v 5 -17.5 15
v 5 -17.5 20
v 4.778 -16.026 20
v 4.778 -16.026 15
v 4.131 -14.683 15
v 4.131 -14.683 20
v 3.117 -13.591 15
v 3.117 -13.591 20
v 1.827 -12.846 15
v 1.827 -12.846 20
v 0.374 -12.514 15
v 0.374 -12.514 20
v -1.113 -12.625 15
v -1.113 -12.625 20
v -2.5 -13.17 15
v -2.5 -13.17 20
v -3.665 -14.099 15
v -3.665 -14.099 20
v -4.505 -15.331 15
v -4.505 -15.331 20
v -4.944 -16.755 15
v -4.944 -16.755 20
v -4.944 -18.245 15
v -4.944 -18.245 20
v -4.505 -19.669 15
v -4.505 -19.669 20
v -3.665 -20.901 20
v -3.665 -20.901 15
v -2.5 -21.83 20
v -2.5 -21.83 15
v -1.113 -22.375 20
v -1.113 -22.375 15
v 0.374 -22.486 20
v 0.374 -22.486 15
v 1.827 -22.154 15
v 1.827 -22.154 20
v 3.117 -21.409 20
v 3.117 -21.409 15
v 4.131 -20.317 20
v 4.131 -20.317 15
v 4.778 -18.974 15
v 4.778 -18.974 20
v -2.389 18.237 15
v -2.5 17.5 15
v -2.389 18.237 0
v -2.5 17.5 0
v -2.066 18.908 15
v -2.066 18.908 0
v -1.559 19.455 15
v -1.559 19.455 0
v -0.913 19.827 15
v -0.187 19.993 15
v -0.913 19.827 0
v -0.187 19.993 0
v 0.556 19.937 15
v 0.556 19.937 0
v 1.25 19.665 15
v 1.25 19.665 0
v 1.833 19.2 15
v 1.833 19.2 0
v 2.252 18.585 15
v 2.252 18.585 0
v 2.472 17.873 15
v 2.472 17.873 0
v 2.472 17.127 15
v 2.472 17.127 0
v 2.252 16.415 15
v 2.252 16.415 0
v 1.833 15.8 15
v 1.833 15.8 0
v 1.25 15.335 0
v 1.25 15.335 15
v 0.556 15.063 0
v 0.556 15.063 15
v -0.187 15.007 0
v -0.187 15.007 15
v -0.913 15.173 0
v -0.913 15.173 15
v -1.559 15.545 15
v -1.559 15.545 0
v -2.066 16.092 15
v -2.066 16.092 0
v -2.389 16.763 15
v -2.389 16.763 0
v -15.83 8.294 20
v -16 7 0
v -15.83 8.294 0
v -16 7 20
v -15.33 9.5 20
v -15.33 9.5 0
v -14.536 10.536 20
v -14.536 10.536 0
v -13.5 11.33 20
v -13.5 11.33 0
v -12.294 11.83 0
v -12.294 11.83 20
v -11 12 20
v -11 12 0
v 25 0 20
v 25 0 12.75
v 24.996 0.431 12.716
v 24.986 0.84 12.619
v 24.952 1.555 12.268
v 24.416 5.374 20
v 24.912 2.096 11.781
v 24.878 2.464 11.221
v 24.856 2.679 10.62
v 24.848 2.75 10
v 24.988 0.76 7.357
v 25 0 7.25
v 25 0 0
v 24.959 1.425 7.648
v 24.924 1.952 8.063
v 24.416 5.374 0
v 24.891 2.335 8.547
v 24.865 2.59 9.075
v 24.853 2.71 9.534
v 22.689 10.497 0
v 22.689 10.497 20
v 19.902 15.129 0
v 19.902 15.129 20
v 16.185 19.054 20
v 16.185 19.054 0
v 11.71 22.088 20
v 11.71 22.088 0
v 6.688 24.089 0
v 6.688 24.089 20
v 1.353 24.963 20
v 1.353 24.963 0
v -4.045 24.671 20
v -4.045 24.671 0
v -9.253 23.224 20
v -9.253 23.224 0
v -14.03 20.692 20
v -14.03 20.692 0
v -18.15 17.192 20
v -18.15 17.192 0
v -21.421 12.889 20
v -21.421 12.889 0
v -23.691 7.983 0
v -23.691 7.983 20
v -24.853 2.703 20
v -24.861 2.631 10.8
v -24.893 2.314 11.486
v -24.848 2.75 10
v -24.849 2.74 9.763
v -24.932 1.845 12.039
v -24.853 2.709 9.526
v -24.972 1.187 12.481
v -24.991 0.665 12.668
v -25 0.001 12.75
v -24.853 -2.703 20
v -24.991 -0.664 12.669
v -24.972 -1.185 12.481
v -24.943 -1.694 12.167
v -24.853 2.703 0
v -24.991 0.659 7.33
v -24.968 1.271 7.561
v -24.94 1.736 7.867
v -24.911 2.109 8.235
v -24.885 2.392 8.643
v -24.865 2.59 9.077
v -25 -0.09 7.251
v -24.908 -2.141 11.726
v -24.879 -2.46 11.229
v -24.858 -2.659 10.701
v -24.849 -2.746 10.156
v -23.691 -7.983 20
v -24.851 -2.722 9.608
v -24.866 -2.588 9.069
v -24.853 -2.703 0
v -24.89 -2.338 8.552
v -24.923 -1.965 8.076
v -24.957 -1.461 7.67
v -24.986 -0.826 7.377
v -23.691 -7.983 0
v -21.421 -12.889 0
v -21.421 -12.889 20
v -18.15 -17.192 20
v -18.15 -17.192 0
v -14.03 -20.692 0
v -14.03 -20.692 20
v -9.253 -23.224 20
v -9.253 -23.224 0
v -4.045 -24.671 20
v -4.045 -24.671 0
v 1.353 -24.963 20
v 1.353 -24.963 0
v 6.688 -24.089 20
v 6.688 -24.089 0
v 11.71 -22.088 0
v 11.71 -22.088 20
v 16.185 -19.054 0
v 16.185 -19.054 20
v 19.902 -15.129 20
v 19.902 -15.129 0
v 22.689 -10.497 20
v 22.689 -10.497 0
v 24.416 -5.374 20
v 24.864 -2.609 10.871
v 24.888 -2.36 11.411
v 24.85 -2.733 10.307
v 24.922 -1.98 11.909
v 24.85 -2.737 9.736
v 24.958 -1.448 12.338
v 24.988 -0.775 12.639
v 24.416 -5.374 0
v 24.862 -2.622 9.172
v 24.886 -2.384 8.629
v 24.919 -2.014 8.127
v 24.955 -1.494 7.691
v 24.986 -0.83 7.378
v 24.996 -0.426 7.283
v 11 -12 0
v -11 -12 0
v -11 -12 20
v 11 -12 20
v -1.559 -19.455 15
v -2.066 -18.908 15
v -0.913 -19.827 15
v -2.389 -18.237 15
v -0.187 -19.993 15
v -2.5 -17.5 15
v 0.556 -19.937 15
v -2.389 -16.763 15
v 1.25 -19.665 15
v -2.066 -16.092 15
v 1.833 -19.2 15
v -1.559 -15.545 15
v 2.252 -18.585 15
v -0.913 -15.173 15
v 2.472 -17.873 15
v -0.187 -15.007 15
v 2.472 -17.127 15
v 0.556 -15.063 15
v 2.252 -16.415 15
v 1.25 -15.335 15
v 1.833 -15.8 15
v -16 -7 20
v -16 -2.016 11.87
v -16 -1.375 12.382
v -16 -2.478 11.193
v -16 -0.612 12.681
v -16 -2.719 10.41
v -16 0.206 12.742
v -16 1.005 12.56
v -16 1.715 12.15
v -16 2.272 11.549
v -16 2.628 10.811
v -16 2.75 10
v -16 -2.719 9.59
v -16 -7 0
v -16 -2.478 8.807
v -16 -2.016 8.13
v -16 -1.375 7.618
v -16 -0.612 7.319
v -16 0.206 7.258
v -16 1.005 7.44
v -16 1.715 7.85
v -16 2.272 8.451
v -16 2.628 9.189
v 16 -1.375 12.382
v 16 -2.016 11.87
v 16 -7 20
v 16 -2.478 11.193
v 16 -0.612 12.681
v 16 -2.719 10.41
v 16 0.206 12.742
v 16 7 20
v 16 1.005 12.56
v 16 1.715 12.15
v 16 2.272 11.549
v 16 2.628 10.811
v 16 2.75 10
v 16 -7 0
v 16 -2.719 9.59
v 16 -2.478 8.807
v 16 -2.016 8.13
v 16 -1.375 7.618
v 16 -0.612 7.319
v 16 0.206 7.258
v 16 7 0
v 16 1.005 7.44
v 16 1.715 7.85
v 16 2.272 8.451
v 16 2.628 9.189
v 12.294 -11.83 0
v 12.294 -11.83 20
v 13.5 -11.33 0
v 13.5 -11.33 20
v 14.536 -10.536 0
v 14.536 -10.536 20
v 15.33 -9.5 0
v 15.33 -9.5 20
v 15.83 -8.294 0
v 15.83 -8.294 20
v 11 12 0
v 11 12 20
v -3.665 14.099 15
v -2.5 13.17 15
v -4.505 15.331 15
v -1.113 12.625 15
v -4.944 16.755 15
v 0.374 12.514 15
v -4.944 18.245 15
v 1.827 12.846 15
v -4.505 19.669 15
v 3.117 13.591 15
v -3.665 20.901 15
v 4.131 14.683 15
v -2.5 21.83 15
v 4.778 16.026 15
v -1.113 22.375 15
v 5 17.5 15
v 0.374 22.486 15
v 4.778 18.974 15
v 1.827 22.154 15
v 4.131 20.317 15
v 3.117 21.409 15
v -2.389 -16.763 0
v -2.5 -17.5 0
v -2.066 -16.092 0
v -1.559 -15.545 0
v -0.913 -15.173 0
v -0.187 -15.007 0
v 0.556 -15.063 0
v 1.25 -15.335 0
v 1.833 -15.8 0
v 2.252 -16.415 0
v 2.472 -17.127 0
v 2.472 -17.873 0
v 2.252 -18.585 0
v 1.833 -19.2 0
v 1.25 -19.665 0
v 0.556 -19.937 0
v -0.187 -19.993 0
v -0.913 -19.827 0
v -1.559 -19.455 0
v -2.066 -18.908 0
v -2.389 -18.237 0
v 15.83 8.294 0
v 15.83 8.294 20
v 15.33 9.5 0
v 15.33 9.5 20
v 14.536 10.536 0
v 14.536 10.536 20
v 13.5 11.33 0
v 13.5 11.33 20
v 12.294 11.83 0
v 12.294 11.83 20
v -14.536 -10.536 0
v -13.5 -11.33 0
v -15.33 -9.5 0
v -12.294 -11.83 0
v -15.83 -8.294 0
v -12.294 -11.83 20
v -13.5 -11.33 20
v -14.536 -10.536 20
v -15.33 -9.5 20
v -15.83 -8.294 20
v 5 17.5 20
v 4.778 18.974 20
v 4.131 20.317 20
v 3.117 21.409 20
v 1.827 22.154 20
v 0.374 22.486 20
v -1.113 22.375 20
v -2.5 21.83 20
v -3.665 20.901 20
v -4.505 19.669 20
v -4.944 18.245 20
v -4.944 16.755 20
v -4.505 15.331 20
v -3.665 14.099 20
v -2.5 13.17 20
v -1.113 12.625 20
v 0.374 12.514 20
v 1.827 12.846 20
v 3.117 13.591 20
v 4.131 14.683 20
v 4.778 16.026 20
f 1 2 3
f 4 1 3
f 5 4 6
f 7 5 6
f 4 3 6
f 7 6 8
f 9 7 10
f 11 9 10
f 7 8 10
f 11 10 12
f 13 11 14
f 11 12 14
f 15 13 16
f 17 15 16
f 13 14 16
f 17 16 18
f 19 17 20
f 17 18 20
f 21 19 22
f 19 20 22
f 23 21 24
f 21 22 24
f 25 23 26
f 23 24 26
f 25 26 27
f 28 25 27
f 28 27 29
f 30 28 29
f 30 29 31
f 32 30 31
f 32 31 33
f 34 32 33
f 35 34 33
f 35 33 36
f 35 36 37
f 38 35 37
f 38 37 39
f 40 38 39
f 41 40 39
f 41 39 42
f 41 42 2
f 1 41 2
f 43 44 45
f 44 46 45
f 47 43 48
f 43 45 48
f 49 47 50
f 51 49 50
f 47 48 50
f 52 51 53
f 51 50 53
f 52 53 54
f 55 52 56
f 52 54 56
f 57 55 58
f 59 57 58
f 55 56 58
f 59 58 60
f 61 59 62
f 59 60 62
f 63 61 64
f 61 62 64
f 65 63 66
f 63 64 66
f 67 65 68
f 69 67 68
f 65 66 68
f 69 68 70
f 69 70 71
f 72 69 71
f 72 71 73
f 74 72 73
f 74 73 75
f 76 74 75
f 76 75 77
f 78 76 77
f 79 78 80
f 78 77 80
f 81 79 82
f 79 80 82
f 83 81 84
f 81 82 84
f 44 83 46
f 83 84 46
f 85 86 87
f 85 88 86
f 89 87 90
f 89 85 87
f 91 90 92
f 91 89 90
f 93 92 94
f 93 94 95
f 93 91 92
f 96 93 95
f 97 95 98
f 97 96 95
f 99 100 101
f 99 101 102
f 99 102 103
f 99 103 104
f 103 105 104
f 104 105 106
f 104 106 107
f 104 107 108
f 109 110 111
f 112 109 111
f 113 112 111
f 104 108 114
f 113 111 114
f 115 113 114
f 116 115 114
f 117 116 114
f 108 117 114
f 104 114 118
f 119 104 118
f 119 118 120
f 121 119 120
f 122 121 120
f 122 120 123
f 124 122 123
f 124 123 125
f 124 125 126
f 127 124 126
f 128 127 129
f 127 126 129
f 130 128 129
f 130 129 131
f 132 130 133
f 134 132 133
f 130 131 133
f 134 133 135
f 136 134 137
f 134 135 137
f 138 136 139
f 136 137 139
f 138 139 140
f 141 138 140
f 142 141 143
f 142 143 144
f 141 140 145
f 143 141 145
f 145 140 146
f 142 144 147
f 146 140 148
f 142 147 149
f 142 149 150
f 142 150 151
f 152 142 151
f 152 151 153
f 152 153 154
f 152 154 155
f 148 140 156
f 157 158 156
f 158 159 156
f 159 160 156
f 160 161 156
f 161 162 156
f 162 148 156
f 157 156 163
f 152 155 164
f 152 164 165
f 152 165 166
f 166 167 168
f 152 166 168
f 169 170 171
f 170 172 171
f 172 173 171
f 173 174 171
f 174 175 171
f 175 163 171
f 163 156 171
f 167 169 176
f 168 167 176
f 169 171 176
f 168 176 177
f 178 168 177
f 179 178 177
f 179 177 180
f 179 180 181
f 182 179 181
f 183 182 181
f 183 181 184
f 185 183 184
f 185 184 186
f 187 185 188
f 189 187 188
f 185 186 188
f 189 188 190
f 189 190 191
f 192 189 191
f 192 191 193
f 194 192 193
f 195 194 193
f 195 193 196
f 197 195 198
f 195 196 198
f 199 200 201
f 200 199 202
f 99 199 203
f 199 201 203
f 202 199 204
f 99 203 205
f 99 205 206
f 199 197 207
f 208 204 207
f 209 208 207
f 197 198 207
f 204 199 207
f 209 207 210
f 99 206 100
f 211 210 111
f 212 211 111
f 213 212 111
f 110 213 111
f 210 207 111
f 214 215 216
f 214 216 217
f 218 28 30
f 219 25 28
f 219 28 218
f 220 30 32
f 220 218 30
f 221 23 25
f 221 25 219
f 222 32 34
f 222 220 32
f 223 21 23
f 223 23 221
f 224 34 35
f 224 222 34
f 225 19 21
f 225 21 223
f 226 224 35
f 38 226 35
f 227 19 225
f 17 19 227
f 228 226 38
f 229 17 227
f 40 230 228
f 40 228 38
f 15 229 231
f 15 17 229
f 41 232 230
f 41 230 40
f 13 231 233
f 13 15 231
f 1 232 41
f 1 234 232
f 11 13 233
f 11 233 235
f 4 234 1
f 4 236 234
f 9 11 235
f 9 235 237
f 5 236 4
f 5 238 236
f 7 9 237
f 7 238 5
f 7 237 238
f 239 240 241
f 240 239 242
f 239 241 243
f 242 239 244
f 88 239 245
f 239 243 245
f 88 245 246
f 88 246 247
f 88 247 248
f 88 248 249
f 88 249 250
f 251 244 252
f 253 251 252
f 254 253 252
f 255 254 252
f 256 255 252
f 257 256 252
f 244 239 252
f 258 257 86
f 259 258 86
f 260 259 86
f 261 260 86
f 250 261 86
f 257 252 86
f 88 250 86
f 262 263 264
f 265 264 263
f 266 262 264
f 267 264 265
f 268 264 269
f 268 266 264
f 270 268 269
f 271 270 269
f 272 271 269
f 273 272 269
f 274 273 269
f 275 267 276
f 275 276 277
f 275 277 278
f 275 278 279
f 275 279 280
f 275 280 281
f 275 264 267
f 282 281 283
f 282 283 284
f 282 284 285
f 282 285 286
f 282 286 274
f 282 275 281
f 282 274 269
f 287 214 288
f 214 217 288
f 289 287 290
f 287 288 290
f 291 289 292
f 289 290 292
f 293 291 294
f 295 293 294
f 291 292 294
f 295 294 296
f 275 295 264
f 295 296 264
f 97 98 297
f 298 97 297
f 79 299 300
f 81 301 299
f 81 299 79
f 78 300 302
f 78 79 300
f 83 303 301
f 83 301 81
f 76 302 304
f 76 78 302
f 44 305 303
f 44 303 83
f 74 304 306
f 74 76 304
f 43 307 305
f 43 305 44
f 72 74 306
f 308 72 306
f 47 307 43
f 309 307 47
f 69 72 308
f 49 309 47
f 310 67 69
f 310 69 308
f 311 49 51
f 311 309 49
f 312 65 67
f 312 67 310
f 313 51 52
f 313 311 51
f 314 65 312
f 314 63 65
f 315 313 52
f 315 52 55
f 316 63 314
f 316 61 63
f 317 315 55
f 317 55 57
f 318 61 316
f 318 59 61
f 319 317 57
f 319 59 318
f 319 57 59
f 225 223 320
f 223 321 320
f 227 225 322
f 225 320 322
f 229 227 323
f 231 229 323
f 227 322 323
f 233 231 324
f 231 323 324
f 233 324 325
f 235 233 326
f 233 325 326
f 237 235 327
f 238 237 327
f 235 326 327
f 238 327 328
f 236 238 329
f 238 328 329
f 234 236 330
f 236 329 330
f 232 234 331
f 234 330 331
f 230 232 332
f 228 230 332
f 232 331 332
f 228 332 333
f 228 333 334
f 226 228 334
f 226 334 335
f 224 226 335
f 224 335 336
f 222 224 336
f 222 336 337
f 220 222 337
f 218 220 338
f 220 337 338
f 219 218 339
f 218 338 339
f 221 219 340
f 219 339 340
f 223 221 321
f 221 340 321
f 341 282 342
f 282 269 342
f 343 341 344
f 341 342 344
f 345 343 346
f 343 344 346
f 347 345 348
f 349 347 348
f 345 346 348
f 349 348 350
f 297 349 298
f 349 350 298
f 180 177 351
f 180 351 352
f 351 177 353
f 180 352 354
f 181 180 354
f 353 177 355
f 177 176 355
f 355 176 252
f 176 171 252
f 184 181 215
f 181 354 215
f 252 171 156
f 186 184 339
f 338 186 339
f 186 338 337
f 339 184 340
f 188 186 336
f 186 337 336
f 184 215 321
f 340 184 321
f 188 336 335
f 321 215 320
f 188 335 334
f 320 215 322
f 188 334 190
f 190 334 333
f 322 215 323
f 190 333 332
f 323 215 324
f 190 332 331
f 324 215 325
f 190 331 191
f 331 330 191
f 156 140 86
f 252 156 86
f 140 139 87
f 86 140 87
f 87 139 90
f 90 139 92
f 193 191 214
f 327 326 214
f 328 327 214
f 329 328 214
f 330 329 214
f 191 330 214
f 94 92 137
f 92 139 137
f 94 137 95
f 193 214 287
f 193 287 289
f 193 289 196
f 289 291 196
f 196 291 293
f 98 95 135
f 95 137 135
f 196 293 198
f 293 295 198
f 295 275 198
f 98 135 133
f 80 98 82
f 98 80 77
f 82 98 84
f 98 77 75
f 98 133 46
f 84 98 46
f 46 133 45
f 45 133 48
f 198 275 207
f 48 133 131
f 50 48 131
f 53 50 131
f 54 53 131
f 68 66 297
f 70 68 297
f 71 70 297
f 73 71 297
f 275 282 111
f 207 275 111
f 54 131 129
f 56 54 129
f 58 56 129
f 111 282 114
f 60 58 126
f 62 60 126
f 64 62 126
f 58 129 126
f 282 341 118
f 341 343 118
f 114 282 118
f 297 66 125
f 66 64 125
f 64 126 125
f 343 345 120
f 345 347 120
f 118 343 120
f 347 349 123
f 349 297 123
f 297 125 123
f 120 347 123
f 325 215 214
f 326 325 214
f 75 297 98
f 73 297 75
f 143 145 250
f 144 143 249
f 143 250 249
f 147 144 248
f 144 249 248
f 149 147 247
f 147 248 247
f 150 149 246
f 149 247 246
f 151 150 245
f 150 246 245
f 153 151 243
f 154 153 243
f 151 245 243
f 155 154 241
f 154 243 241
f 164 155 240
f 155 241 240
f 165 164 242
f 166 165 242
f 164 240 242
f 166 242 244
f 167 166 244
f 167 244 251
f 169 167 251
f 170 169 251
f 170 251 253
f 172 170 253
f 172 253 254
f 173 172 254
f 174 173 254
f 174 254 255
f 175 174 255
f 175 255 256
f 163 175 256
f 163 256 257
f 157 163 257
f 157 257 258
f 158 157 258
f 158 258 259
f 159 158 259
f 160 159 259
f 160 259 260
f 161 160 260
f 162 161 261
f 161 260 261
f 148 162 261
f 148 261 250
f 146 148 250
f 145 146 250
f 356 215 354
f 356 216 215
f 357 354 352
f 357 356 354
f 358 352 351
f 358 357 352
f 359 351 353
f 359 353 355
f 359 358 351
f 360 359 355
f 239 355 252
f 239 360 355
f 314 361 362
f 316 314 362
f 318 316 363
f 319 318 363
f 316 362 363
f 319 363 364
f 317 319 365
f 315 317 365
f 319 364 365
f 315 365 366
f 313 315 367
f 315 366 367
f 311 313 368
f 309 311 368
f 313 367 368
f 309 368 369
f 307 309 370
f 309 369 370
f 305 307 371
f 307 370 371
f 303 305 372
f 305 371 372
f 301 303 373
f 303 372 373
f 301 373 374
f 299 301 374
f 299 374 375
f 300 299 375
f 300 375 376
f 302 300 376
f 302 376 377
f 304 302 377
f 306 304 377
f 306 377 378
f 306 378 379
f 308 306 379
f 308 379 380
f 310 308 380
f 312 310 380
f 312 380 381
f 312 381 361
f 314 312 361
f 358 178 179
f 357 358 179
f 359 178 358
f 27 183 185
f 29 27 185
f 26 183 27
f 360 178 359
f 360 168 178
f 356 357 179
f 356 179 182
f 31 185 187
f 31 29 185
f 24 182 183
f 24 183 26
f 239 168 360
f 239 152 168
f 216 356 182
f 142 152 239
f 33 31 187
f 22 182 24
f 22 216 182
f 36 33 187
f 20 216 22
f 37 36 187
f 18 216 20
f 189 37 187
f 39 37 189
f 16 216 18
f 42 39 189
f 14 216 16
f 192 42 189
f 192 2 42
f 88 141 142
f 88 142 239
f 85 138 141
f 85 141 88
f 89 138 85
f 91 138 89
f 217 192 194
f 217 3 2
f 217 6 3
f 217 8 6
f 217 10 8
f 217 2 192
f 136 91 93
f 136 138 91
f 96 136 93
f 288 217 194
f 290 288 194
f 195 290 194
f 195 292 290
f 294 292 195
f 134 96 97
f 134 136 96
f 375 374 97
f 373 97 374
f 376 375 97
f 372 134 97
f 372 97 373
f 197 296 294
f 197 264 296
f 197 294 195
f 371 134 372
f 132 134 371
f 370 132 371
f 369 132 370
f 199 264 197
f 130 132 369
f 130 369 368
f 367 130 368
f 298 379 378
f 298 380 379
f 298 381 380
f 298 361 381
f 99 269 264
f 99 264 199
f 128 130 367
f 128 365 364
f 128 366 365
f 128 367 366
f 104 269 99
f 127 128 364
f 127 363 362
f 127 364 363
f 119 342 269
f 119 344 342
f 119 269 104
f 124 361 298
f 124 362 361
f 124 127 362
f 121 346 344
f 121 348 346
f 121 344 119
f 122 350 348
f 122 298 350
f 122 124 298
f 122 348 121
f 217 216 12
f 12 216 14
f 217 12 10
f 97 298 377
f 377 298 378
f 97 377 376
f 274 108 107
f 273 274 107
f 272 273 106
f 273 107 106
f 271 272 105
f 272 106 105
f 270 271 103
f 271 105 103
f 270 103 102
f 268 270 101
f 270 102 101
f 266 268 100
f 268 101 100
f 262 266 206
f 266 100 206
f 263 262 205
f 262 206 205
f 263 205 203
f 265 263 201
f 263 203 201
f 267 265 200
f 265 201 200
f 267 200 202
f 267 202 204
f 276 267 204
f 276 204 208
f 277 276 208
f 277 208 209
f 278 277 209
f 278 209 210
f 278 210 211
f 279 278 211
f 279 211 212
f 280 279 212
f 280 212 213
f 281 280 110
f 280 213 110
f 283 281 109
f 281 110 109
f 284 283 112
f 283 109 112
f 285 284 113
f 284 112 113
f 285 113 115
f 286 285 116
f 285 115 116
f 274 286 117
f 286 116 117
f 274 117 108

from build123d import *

# Parameters (mm, degrees)
F0_R           = 25
F0_W           = 32
F0_H           = 24
F1_DEPTH       = 20
F3_D           = 5
F3_CBORE_D     = 10
F3_CBORE_DEPTH = 5
F6_D           = 5.5
F7_R           = 5


with BuildPart() as f1:
    # F0 (on Top) → F1 (new body)
    with BuildSketch(Plane.XY):
        Circle(F0_R)
        Rectangle(F0_W, F0_H, mode=Mode.SUBTRACT)
    extrude(amount=F1_DEPTH)

    # F3 (through all)
    with Locations(Plane.XY.offset(20)):
        with Locations((0, 17.5), (0, -17.5)):
            CounterBoreHole(F3_D / 2, F3_CBORE_D / 2, F3_CBORE_DEPTH)

    # F6 (through all)
    with Locations(Plane(origin=(-34, 0, 0), x_dir=(0, -1, 0), z_dir=(-1, 0, 0))):
        with Locations((0, 10)):
            Hole(F6_D / 2)

    # F7
    f7_edges = [f1.edges().sort_by_distance(p)[0] for p in [
        (16, 12, 10),
        (-16, 12, 10),
        (-16, -12, 10),
        (16, -12, 10),
    ]]
    fillet(f7_edges, radius=F7_R)


solid = f1.part
